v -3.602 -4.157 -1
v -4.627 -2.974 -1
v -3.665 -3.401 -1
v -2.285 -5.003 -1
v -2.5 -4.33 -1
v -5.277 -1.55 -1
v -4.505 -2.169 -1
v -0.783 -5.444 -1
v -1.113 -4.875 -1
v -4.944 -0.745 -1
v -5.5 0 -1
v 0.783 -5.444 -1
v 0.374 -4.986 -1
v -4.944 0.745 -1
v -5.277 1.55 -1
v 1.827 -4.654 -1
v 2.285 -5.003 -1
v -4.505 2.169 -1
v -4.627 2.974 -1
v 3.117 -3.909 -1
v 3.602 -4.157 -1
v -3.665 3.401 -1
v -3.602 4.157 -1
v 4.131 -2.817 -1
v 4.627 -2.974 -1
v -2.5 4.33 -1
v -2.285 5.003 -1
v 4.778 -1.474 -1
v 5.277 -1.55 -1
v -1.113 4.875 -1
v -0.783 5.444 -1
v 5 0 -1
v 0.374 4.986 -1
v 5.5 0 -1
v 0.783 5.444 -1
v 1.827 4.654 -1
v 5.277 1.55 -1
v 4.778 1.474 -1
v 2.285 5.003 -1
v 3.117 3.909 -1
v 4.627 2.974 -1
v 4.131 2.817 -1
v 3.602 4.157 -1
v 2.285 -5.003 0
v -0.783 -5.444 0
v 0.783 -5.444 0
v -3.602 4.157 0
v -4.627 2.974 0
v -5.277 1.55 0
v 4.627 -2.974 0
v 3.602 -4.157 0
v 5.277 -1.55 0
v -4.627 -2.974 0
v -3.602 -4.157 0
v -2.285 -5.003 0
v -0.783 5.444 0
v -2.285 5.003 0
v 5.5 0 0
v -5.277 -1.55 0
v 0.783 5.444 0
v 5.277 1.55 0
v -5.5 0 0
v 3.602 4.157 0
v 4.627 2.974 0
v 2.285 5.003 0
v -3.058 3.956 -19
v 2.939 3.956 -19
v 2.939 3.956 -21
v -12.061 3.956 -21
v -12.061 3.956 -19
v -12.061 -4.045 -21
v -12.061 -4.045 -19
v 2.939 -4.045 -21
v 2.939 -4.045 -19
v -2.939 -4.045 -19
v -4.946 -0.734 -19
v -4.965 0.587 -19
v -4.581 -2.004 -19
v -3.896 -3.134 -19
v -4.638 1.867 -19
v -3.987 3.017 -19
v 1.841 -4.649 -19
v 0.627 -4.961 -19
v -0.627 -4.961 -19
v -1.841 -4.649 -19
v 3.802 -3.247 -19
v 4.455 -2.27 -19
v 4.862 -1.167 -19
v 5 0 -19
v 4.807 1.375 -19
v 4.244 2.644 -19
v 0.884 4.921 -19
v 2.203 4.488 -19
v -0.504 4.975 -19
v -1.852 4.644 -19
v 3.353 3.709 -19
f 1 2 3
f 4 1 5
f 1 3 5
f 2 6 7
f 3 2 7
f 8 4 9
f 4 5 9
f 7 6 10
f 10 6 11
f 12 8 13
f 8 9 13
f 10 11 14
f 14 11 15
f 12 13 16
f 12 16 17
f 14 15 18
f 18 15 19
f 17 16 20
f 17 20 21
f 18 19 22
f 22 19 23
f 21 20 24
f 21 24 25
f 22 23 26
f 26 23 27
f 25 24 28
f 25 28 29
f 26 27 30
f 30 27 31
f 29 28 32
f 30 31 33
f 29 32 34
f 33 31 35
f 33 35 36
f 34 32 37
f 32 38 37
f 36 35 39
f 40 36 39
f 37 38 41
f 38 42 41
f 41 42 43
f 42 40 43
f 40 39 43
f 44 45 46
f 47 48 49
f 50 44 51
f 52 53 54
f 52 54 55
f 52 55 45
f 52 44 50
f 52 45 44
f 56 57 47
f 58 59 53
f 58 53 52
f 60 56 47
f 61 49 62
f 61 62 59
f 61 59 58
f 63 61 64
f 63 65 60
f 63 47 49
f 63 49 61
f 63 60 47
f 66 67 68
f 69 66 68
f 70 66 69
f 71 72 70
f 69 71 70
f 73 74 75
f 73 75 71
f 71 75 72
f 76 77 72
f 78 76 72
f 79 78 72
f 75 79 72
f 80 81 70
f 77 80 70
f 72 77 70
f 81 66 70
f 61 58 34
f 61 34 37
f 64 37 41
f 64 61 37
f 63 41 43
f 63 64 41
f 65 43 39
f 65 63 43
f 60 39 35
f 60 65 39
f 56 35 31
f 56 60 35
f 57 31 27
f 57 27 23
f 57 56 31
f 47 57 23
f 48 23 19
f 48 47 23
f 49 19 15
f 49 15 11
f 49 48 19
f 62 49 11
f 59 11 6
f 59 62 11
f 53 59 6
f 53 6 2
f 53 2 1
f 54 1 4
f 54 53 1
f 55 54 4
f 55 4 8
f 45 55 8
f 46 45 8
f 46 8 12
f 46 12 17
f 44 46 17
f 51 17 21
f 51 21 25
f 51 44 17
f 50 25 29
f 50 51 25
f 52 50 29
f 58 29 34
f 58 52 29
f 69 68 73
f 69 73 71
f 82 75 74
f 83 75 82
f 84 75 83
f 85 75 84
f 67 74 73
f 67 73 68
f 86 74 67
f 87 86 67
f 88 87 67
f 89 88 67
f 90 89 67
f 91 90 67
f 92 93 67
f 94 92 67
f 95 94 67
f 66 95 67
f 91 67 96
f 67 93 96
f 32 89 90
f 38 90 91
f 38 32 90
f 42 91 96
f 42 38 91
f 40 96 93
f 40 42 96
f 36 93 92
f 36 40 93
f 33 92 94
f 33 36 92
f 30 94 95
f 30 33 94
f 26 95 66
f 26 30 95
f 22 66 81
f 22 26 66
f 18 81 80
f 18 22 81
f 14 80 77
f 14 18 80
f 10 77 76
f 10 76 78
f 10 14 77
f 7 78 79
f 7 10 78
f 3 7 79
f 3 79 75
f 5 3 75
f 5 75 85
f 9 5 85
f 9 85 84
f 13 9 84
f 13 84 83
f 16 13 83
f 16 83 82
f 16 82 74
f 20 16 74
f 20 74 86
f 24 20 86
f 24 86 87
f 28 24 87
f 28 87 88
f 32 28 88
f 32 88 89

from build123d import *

# Parameters (mm, degrees)
ESQUISSE1_R        = 5.5
ESQUISSE1_R_2      = 5
BOSS_EXTRU_1_DEPTH = 1
ESQUISSE4_R        = 5
BOSS_EXTRU_2_DEPTH = 19
ESQUISSE5_W        = 15
ESQUISSE5_H        = 8.000613173
BOSS_EXTRU_3_DEPTH = 2


with BuildPart() as part:
    # Esquisse1 → Boss.-Extru.1 (new body)
    with BuildSketch(Plane.XY):
        Circle(ESQUISSE1_R)
        Circle(ESQUISSE1_R_2, mode=Mode.SUBTRACT)
    extrude(amount=-BOSS_EXTRU_1_DEPTH)

    # Esquisse4 → Boss.-Extru.2 (add)
    with BuildSketch(Plane.XY):
        Circle(ESQUISSE4_R)
    extrude(amount=-BOSS_EXTRU_2_DEPTH)

    # Esquisse5 → Boss.-Extru.3 (add)
    with BuildSketch(Plane(origin=(0, 0, -19), x_dir=(-1, 0, 0), z_dir=(0, 0, -1))):
        with Locations((4.560754253, -0.044546246)):
            Rectangle(ESQUISSE5_W, ESQUISSE5_H)
    extrude(amount=BOSS_EXTRU_3_DEPTH)


solid = part.part
